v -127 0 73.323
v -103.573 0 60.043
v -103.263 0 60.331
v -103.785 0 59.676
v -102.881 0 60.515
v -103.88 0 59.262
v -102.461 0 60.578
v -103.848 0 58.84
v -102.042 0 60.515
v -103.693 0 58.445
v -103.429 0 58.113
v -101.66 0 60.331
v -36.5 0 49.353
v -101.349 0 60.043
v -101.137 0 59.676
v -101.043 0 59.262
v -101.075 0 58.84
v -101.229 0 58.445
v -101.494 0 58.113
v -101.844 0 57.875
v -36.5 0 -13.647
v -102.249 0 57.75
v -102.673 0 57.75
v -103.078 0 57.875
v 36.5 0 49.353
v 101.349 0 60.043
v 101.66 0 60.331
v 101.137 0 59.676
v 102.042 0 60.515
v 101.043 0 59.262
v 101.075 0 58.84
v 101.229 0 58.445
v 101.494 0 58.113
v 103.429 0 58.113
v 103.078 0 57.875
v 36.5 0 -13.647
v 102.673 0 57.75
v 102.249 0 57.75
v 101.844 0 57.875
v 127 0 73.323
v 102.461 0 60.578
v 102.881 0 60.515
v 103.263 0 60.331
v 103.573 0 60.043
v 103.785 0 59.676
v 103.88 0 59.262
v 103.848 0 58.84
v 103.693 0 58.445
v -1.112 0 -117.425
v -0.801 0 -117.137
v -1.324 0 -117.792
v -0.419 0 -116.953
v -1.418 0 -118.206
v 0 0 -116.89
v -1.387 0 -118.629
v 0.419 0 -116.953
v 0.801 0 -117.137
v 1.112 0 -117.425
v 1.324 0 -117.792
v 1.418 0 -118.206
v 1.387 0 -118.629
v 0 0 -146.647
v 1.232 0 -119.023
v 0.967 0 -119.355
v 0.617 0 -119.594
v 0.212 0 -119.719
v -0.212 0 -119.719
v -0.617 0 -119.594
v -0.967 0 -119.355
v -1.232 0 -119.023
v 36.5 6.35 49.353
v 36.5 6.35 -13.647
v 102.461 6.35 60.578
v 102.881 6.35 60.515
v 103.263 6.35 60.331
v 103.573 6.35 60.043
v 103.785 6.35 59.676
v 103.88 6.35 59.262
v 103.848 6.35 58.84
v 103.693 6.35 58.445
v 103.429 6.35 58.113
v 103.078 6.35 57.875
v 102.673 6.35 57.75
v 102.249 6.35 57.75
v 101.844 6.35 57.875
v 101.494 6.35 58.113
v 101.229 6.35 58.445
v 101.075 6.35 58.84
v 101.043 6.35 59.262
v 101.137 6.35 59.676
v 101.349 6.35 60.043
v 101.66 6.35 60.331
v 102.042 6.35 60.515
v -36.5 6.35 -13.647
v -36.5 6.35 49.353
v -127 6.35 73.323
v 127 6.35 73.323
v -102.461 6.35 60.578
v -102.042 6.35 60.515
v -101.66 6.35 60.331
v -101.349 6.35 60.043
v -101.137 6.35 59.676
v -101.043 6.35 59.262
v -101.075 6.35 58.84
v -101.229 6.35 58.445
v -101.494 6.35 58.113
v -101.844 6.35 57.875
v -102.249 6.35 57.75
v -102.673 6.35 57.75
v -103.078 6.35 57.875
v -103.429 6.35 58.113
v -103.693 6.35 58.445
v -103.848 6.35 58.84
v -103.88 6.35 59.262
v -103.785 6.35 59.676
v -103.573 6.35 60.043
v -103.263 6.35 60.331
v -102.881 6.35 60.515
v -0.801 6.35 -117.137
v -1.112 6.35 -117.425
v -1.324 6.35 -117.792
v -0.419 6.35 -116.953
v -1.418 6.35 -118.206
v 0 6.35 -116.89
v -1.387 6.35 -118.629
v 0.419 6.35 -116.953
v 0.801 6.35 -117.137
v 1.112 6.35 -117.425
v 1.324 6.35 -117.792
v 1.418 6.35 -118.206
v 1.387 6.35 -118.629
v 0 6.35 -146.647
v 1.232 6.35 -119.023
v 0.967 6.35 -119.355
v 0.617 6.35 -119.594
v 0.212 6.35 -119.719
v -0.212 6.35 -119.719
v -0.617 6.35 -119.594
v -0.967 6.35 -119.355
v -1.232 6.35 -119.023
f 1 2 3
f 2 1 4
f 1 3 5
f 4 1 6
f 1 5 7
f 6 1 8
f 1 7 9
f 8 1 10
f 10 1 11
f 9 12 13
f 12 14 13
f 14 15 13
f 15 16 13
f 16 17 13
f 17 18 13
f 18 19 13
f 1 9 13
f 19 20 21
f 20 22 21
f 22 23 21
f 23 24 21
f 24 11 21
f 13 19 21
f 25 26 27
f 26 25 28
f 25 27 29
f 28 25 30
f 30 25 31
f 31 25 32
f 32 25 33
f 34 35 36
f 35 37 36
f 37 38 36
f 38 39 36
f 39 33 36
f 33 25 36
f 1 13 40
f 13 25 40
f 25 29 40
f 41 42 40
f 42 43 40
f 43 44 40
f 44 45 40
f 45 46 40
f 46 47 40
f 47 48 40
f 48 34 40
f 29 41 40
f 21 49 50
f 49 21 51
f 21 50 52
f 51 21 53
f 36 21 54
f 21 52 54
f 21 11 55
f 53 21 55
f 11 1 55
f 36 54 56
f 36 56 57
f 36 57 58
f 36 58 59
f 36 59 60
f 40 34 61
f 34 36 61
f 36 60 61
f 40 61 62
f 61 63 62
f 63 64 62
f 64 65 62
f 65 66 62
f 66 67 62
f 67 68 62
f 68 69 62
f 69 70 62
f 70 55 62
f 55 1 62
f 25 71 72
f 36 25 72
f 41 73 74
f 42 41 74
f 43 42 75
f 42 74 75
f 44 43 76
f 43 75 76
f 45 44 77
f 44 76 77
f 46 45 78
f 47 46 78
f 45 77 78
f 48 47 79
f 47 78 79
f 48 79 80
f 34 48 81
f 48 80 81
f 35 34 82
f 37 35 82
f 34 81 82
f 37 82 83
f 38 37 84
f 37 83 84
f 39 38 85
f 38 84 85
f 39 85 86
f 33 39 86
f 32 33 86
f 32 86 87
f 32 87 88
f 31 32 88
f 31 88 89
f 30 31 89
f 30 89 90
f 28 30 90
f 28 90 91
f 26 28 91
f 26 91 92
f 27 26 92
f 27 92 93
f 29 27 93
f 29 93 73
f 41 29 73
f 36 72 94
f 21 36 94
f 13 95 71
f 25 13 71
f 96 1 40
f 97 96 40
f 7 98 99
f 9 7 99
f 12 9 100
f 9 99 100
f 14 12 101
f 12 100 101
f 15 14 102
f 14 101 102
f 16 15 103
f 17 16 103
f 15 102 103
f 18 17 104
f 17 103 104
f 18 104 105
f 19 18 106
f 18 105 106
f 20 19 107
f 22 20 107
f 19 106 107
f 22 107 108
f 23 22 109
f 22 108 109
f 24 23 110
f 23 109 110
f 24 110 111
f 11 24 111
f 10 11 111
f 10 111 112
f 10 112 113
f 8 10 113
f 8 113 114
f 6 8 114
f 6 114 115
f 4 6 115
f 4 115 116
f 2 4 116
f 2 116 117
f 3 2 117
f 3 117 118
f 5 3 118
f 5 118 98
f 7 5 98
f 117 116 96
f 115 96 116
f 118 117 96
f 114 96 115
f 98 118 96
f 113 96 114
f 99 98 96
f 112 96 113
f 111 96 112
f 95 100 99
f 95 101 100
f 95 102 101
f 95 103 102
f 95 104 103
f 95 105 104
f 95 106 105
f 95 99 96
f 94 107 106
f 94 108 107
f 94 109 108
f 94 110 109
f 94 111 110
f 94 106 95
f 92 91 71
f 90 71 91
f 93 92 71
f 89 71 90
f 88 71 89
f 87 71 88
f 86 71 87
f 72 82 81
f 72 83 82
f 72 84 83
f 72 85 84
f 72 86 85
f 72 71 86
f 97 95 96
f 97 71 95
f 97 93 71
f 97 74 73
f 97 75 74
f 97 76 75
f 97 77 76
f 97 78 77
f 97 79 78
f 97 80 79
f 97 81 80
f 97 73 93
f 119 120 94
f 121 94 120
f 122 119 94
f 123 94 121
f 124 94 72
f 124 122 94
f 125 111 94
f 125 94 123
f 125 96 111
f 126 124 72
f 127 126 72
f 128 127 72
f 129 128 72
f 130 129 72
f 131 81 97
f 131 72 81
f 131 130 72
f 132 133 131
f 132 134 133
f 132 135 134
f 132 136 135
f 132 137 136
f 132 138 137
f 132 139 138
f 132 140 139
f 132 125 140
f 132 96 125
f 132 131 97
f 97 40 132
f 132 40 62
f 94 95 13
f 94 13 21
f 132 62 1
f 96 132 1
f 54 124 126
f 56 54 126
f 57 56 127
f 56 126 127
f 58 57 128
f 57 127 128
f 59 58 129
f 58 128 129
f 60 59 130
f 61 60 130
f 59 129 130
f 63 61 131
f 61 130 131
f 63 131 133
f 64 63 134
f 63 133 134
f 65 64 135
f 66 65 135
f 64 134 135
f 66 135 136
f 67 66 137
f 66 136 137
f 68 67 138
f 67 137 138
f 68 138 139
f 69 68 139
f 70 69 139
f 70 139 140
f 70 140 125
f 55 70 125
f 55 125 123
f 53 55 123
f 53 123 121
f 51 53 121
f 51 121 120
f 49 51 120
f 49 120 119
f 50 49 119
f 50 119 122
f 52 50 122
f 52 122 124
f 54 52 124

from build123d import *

# Parameters (mm, degrees)
BOSS_EXTRUDE1_DEPTH = 6.35
SKETCH2_W           = 36.5
SKETCH2_H           = 63
SKETCH2_R           = 1.4224
CUT_EXTRUDE2_DEPTH  = 195.099602868


with BuildPart() as part:
    # Sketch1 → Boss-Extrude1 (new body)
    with BuildSketch(Plane(origin=(0, 0, 0), x_dir=(1, 0, 0), z_dir=(0, 1, 0))):
        Polygon((0, 146.646968374), (-127, -73.323484187), (127, -73.323484187), align=None)
    extrude(amount=BOSS_EXTRUDE1_DEPTH)

    # Sketch2 → Cut-Extrude2 (cut, through all)
    with BuildSketch(Plane(origin=(0, 6.35, 0), x_dir=(1, 0, 0), z_dir=(0, 1, 0))):
        with Locations((-18.25, -17.853484187)):
            Rectangle(SKETCH2_W, SKETCH2_H)
        with Locations((18.25, -17.853484187)):
            Rectangle(SKETCH2_W, SKETCH2_H)
        with Locations(Location((0, 118.312139176, 0), (0, 0, 270))):
            Circle(SKETCH2_R)
        with Locations(Location((-102.461318102, -59.156069588, 0), (0, 0, 270))):
            Circle(SKETCH2_R)
        with Locations(Location((102.461318102, -59.156069588, 0), (0, 0, 270))):
            Circle(SKETCH2_R)
    extrude(amount=-CUT_EXTRUDE2_DEPTH, mode=Mode.SUBTRACT)


solid = part.part
